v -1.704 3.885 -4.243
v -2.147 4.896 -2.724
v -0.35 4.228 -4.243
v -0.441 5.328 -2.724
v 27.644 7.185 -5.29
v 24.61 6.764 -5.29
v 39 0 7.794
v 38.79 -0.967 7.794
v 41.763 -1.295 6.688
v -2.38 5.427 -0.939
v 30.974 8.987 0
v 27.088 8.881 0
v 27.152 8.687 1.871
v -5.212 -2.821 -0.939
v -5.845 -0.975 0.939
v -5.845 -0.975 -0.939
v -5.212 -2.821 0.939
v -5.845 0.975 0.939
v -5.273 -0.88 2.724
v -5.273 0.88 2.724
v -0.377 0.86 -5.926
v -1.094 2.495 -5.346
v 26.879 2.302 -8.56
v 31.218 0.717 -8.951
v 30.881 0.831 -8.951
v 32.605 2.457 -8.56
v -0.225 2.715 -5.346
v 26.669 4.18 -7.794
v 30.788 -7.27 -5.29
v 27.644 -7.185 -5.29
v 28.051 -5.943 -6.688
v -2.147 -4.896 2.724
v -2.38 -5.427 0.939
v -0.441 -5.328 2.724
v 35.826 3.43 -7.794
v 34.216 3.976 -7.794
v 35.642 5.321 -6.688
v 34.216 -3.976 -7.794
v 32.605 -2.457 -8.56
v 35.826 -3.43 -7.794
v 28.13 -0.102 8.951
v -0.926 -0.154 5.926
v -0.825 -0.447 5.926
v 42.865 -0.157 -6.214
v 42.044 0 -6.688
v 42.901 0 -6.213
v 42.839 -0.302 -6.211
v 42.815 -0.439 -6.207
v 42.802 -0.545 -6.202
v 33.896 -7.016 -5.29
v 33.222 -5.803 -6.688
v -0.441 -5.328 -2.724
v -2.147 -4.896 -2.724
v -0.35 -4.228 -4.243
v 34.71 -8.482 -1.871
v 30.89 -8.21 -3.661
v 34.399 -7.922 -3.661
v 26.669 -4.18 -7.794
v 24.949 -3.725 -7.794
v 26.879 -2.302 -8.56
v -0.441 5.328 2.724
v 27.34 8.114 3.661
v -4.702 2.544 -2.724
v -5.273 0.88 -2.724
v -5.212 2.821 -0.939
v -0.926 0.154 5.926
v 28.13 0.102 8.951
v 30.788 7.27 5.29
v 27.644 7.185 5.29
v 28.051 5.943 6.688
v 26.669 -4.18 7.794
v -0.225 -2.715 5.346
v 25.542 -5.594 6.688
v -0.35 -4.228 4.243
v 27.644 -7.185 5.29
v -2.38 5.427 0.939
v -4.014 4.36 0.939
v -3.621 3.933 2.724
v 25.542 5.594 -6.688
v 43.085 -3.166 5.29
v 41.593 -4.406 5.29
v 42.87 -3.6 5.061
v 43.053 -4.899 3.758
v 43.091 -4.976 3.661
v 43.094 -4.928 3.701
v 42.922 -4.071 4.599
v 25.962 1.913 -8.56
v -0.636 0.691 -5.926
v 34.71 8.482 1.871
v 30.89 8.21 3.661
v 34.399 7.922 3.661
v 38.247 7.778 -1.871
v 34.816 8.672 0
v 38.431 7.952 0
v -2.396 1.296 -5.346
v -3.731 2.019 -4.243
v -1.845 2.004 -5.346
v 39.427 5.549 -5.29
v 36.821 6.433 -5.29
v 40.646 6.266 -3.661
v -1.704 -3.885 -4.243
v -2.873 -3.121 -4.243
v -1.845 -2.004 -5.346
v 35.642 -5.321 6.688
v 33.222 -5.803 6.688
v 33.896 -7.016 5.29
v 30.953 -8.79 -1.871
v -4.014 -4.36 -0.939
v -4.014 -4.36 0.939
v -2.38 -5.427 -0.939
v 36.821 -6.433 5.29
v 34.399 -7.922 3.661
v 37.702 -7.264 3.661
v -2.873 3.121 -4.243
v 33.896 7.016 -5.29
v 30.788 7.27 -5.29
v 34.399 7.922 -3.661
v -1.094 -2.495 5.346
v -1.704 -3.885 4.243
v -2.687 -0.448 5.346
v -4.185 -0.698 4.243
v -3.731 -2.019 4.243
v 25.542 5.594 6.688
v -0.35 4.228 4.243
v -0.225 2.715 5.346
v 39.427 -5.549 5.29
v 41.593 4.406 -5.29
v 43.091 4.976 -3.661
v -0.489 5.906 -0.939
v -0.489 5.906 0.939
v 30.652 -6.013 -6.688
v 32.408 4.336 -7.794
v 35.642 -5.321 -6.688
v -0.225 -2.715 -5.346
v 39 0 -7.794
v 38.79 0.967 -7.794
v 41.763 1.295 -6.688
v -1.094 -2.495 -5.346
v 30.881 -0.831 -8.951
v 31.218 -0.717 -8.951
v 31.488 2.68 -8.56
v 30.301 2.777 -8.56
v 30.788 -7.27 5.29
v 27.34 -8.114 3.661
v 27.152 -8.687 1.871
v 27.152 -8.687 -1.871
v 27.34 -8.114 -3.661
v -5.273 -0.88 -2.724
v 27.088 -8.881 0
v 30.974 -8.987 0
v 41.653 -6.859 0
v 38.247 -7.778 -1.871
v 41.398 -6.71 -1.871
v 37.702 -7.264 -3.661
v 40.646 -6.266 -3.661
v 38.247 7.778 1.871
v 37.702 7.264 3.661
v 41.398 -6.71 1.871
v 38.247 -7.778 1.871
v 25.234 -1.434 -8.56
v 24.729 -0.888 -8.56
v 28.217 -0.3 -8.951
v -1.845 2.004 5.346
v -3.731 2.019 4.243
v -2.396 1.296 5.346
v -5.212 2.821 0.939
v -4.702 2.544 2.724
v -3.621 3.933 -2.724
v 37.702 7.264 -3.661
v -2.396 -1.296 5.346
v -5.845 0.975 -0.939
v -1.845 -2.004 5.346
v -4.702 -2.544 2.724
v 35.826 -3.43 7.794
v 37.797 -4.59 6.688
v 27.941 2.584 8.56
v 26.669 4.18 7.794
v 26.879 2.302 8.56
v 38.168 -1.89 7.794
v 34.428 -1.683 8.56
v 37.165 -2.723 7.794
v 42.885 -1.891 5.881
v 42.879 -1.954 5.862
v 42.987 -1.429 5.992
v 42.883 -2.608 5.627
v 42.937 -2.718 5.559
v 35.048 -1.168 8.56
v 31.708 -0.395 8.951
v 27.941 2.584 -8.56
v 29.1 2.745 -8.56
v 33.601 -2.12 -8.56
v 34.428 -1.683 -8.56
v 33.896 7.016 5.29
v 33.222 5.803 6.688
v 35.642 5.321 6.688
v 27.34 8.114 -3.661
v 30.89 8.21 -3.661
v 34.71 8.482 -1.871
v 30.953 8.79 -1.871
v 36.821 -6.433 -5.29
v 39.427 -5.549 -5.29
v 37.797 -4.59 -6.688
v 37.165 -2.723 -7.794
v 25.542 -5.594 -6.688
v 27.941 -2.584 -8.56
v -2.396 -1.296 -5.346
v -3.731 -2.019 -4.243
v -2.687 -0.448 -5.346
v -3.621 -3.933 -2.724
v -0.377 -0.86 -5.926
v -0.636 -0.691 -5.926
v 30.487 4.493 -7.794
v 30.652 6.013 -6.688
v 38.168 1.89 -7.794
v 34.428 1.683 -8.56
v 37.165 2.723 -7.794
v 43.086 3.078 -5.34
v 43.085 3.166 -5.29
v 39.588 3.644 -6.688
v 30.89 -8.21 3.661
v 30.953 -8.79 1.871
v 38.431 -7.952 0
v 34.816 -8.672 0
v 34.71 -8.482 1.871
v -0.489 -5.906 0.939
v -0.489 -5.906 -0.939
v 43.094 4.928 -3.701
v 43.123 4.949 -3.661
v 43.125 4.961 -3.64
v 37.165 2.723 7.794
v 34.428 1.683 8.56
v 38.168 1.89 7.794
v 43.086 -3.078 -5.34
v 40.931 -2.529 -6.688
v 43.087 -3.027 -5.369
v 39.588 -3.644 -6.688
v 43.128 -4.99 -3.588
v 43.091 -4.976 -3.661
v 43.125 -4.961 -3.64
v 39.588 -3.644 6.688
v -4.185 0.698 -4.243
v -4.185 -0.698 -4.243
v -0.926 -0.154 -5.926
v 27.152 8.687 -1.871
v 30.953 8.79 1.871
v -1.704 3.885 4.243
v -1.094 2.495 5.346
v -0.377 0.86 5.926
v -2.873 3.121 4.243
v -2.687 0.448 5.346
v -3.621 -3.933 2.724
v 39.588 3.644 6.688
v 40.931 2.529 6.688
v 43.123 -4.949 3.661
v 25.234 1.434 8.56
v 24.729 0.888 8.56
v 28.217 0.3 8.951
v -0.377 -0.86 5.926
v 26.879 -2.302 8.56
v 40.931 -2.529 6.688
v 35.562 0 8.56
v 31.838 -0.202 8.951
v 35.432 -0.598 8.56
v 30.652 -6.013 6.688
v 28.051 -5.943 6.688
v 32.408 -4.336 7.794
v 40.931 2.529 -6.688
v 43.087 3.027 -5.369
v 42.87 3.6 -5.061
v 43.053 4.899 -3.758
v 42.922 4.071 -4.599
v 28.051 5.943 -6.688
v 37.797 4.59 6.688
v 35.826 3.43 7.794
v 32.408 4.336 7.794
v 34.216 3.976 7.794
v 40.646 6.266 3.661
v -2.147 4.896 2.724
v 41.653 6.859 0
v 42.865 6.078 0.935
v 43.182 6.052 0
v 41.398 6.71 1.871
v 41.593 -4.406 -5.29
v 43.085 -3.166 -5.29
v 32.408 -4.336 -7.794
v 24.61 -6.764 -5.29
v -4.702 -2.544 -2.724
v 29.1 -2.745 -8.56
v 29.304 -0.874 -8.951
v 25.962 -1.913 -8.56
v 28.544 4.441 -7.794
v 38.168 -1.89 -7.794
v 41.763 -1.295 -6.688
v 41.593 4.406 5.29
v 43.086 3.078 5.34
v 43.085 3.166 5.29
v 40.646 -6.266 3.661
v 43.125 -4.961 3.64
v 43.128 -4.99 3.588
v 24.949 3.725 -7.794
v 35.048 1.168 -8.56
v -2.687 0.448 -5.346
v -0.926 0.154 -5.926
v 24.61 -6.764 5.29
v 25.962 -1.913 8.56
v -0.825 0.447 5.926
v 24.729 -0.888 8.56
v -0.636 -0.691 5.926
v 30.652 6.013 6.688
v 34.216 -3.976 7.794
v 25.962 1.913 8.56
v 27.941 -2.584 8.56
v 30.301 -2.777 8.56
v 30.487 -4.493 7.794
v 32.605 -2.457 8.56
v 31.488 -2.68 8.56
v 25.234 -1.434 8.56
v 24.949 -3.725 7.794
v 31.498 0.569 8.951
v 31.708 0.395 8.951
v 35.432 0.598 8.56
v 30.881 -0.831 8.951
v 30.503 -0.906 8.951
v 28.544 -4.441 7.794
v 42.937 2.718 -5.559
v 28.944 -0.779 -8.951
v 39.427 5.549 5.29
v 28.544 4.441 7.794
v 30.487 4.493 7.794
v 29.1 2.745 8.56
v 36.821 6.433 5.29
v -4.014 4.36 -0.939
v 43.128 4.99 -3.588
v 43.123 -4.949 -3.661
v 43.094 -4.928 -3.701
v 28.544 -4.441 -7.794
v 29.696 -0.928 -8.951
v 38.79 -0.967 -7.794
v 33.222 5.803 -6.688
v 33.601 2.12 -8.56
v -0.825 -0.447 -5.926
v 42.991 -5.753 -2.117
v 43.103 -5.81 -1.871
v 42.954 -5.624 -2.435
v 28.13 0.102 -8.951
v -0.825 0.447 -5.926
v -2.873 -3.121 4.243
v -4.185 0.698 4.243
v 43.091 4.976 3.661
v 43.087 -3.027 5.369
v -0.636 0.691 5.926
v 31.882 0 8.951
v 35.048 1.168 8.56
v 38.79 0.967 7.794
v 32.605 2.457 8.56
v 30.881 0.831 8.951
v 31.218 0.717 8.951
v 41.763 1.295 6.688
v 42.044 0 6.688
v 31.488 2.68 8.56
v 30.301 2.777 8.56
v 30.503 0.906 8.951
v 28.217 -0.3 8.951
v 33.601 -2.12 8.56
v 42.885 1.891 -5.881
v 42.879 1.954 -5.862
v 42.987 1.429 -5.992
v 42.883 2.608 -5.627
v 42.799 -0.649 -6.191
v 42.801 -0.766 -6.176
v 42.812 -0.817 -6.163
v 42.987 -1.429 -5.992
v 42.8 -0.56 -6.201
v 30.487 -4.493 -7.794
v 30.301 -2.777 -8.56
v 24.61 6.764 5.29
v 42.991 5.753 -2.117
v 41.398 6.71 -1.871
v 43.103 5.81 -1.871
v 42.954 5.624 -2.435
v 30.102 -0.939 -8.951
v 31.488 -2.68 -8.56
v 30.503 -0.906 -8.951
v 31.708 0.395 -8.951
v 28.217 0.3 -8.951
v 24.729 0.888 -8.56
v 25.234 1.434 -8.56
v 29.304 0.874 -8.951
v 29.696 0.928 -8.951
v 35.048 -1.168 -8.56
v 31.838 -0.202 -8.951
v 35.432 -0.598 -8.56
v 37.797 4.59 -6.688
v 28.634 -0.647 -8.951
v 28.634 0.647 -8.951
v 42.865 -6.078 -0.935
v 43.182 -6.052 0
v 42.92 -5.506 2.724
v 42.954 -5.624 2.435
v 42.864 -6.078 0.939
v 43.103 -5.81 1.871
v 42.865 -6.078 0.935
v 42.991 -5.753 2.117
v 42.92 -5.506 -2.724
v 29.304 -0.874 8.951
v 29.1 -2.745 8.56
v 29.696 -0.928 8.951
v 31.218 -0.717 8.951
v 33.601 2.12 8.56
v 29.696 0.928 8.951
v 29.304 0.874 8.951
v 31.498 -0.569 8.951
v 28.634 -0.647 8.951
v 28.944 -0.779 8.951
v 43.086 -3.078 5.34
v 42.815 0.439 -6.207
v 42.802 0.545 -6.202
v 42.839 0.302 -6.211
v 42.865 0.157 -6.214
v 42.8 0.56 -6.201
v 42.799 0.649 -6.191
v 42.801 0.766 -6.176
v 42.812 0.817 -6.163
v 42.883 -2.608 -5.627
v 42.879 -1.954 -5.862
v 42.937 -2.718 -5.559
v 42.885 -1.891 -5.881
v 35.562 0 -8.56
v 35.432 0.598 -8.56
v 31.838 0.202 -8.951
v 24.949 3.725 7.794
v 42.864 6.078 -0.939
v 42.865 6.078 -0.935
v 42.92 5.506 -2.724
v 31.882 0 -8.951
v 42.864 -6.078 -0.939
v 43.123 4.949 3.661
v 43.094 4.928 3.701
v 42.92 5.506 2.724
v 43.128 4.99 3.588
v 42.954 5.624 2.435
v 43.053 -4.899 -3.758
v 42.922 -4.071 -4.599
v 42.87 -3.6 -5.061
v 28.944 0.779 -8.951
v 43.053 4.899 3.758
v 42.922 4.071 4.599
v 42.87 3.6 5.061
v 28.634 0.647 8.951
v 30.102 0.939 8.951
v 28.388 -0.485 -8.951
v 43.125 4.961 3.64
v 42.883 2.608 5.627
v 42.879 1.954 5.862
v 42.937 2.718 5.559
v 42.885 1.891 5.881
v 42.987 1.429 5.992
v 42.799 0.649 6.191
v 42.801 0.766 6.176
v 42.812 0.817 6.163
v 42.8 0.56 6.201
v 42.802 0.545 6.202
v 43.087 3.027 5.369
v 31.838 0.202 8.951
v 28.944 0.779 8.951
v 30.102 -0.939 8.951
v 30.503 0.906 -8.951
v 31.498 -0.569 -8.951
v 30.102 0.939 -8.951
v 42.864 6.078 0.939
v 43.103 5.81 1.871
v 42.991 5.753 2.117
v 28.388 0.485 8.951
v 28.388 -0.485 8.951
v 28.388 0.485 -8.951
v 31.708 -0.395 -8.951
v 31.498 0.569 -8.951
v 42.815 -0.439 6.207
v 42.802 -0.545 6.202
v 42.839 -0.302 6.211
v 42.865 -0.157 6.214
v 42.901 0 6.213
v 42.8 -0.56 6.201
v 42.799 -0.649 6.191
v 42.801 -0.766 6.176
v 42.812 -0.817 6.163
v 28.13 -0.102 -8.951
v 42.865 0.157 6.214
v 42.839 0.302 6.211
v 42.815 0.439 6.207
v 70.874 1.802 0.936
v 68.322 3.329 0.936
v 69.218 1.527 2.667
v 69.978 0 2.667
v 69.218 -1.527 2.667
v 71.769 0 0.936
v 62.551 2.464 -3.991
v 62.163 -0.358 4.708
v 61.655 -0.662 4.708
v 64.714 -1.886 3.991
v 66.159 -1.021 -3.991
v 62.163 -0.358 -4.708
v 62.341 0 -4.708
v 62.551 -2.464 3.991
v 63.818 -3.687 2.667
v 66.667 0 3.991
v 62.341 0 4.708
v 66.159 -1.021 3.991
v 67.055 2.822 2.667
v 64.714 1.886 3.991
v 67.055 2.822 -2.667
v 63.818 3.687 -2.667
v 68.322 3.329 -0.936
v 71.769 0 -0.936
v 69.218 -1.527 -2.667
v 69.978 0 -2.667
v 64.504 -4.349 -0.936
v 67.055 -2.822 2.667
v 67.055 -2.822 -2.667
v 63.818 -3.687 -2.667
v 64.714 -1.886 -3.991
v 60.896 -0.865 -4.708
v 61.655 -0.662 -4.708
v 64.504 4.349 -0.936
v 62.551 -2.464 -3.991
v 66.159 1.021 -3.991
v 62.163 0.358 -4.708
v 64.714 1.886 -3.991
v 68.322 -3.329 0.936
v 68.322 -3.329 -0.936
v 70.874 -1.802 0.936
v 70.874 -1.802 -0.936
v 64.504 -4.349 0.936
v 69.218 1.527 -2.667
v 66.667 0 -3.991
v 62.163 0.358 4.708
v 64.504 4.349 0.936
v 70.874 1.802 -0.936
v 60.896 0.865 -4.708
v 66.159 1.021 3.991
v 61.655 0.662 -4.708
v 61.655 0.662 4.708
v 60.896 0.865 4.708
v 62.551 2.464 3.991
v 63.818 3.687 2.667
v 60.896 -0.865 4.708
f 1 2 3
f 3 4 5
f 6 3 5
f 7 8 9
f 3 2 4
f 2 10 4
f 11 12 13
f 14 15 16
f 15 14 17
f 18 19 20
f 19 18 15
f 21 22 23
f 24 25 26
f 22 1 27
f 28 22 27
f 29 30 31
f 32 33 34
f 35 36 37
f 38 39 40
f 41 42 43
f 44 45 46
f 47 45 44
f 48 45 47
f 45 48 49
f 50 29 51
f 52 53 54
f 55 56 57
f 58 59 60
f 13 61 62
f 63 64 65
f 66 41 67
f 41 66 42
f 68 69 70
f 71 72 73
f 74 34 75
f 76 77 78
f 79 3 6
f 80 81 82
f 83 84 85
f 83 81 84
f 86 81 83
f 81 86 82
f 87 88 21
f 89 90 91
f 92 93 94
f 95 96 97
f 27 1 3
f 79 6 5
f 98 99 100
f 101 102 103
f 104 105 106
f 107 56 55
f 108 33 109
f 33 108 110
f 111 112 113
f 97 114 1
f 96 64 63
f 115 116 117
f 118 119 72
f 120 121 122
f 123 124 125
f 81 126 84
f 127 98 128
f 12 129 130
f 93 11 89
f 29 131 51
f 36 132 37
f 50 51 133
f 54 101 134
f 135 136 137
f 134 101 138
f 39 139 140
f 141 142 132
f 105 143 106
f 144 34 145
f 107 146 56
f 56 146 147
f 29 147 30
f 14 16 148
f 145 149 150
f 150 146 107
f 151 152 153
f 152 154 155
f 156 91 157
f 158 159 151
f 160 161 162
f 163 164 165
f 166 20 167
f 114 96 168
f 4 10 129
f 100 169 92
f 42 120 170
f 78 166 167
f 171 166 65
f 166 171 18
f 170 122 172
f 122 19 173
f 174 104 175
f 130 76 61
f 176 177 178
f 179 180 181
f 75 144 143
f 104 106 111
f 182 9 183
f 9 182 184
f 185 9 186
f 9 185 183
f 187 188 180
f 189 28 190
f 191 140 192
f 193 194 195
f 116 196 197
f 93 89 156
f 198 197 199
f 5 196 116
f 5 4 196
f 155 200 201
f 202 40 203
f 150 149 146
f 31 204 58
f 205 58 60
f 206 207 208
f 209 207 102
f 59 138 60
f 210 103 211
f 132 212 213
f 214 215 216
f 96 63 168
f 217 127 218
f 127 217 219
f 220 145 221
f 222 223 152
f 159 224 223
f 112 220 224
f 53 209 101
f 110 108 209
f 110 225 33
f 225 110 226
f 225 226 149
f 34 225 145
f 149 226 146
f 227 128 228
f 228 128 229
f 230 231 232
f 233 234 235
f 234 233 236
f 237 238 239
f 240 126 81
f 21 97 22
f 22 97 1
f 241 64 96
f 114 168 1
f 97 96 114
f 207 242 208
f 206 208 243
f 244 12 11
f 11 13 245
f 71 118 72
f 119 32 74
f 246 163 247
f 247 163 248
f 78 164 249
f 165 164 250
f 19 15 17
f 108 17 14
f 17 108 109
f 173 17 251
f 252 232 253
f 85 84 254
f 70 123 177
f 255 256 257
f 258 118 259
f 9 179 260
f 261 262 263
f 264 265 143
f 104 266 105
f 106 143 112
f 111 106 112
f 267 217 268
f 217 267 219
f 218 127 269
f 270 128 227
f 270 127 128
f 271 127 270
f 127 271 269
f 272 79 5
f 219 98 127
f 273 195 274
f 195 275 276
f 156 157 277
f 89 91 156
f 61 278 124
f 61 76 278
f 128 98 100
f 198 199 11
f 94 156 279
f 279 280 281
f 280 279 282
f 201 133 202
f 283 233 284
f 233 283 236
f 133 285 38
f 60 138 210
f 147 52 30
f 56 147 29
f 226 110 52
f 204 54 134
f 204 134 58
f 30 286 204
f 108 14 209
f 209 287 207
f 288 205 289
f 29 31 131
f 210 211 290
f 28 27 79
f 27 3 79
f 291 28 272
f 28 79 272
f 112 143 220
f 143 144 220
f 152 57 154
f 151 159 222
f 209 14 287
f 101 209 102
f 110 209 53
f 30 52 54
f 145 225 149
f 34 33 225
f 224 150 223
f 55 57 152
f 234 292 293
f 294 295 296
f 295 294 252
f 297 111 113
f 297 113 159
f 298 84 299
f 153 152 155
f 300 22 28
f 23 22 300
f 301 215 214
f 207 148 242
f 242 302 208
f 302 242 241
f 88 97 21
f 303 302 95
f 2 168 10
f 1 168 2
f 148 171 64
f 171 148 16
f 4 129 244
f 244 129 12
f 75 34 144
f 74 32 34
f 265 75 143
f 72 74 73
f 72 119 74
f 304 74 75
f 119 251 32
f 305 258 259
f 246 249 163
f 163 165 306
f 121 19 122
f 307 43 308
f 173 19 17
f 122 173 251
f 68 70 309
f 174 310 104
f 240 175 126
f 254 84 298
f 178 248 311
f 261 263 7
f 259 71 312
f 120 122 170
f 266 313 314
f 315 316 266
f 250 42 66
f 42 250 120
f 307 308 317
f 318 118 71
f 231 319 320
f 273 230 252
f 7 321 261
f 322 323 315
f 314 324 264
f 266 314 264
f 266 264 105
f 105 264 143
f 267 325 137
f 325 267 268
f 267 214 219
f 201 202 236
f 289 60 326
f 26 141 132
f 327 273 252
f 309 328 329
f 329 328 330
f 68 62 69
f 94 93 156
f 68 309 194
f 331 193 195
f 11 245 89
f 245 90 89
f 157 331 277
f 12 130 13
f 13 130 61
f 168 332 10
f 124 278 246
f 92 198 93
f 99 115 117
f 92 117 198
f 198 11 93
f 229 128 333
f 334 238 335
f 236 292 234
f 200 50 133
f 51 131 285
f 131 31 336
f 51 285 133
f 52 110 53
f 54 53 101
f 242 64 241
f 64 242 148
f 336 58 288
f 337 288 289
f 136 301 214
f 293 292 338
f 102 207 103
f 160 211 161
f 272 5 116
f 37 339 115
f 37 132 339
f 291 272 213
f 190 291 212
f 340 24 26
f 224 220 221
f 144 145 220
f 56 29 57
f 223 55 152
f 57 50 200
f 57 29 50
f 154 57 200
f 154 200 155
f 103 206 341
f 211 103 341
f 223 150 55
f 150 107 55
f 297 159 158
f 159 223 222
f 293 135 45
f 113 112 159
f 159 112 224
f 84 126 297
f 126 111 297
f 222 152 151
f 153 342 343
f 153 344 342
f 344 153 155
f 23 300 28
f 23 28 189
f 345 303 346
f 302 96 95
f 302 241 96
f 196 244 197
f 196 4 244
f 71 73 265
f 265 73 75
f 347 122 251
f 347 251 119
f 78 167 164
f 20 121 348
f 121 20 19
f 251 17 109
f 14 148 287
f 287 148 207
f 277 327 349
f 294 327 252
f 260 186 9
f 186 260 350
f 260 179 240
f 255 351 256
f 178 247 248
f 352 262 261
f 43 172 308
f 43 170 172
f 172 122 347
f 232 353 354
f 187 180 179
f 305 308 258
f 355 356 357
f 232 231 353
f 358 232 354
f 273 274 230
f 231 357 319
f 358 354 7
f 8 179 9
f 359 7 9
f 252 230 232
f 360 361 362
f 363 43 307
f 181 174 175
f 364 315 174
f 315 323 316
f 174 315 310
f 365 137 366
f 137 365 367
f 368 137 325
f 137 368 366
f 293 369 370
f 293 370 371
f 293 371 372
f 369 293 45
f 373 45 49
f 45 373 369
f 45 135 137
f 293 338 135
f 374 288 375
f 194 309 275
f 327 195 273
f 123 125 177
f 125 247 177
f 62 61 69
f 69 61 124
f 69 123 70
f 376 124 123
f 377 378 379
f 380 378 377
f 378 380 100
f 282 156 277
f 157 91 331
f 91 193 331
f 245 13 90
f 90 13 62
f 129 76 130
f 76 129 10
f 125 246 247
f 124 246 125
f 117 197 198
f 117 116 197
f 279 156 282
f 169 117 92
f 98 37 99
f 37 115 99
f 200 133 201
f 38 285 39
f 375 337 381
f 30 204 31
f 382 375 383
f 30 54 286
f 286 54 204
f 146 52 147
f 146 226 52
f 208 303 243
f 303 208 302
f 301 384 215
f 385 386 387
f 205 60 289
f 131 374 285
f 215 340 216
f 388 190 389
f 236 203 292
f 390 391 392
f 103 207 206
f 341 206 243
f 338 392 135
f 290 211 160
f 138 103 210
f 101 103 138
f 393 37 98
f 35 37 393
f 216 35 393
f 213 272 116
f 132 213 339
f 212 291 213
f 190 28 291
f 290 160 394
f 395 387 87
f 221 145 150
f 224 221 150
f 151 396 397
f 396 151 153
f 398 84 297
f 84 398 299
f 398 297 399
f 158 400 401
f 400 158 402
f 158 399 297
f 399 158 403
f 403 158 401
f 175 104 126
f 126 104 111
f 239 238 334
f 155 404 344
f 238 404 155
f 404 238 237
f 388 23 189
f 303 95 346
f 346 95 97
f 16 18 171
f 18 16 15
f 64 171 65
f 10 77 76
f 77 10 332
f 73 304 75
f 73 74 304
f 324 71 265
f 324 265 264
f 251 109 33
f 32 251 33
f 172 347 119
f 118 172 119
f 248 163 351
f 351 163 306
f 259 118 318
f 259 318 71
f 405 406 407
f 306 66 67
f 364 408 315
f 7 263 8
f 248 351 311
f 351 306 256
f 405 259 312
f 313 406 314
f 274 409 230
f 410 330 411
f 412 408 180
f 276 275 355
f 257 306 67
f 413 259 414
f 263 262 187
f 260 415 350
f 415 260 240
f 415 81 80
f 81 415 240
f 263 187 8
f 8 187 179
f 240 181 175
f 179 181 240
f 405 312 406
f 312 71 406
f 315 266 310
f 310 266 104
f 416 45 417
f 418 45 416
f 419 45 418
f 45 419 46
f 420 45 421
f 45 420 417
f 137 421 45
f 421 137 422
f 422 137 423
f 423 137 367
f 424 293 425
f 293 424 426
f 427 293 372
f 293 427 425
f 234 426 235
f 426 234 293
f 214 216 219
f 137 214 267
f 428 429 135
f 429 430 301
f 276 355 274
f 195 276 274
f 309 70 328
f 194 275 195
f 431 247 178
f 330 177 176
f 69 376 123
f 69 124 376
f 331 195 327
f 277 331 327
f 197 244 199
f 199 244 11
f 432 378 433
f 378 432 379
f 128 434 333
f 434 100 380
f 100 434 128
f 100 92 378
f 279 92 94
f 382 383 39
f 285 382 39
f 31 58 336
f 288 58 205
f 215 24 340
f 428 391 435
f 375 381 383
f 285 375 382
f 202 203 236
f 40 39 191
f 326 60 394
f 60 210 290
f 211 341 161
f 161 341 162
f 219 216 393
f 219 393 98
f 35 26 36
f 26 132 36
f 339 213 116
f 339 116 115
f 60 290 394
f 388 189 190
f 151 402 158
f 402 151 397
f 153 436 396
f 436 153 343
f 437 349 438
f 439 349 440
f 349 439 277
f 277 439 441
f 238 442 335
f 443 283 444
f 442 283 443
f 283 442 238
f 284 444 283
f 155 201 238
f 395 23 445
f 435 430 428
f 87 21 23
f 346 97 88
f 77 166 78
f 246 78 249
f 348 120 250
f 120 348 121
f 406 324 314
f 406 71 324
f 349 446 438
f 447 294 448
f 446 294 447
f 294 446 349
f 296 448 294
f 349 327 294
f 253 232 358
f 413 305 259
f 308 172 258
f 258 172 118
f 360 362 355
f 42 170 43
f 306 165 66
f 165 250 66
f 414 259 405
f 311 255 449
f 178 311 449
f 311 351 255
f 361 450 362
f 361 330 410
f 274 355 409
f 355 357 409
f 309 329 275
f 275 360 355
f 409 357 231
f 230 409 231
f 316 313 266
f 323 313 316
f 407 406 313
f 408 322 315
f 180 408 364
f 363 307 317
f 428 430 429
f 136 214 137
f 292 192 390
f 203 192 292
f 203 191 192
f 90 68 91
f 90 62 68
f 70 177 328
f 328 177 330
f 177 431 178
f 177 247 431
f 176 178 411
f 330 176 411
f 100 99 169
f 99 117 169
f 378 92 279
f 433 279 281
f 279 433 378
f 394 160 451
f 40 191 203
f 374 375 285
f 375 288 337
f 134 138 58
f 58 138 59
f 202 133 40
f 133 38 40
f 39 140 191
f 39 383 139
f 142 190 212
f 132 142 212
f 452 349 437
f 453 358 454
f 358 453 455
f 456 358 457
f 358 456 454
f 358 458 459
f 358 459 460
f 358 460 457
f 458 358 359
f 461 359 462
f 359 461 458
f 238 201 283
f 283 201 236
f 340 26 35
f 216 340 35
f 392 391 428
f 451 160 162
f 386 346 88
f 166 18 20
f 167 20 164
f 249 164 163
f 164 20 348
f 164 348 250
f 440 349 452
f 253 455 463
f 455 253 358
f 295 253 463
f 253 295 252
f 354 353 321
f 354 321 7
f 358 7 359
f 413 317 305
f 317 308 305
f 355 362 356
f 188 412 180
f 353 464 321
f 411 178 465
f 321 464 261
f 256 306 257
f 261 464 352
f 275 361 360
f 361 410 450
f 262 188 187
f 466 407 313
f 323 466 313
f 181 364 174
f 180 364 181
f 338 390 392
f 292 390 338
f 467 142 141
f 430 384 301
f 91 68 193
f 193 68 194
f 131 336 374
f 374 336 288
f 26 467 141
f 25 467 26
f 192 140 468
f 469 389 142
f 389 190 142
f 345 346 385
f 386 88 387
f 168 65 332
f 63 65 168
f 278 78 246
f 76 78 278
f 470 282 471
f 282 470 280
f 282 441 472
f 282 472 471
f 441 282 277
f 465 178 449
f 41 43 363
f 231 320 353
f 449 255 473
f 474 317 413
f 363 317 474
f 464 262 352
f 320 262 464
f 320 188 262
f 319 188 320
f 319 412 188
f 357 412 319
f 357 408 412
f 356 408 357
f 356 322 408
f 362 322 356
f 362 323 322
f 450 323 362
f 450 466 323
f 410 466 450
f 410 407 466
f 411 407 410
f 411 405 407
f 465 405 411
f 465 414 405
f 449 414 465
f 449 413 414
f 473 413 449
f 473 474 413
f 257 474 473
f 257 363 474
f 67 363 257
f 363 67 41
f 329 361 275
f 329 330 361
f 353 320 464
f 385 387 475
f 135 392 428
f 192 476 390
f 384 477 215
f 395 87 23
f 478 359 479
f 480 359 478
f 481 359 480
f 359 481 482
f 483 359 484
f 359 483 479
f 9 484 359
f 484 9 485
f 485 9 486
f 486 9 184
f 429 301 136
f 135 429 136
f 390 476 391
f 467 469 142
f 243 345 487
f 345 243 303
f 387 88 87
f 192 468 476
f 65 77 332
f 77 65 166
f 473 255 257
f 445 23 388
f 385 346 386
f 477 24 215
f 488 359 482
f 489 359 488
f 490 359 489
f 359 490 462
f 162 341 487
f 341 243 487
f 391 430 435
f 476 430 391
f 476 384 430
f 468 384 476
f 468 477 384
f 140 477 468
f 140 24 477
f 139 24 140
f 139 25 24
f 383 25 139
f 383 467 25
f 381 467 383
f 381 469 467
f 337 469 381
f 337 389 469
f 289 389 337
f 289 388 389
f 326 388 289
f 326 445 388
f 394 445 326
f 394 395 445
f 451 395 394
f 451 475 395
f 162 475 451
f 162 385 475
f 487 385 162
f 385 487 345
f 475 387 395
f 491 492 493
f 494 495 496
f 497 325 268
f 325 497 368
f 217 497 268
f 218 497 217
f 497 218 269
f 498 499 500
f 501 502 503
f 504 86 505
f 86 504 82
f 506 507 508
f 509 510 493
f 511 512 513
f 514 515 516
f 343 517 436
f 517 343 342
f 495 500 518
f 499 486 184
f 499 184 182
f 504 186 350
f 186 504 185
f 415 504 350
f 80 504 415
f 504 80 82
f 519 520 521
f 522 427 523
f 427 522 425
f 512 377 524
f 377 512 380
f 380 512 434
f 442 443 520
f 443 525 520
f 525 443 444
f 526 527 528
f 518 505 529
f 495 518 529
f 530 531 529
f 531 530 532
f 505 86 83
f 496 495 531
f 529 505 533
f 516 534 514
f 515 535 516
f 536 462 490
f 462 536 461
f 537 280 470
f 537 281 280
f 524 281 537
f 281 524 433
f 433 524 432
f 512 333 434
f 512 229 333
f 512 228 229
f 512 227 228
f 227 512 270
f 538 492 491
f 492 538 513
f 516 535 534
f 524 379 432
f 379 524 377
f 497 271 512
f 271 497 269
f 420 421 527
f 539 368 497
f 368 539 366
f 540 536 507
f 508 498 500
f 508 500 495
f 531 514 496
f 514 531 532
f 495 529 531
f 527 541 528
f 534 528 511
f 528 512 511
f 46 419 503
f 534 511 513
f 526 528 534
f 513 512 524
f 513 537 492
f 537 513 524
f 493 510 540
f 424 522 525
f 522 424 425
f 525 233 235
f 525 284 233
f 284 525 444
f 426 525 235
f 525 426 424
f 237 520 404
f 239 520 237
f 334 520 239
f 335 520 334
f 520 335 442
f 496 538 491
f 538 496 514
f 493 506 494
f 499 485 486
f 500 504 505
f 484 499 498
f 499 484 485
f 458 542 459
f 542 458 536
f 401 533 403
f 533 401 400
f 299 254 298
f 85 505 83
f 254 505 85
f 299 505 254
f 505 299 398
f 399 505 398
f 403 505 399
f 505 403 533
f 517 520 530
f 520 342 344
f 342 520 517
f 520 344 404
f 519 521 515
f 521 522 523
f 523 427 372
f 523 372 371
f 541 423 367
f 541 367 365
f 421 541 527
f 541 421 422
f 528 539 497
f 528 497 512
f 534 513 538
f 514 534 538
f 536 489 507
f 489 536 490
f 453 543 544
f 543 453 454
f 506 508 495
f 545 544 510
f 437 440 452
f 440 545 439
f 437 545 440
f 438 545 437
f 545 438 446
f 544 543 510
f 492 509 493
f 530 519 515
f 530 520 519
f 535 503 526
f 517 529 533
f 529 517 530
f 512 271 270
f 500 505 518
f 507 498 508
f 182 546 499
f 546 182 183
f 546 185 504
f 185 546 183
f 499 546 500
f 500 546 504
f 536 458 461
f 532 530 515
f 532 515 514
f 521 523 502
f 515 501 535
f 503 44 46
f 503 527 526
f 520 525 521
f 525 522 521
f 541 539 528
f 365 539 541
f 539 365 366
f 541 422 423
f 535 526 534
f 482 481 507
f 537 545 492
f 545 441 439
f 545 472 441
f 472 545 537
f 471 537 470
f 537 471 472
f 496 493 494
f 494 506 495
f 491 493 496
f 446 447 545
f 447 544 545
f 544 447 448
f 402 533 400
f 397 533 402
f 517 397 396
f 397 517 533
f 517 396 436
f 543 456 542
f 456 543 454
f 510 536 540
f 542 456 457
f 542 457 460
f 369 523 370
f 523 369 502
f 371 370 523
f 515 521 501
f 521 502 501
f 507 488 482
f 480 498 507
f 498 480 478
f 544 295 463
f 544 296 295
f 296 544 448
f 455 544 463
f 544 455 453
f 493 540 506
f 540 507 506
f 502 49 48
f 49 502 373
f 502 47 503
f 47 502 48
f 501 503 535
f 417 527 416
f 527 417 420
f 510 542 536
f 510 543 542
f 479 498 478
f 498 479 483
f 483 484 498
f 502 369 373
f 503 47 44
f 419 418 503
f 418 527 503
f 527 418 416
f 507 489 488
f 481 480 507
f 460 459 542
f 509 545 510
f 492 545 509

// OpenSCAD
module tentacle_segment(length, girth)
{
	union() {
		hull() {
			sphere(girth);
			translate(v = [length * 0.5, 0, 0])
				scale(v = [2.0, 1, 1])
					sphere(girth * 1.5);
		}
		hull() {
			translate(v = [length * 0.5, 0, 0])
				sphere(girth * 1.2);
			translate(v = [length, 0, 0])
				scale(v = [2.5, 1, 1])
				sphere(girth * 0.8);
		}
	}
}

tentacle_segment(60, 6);
